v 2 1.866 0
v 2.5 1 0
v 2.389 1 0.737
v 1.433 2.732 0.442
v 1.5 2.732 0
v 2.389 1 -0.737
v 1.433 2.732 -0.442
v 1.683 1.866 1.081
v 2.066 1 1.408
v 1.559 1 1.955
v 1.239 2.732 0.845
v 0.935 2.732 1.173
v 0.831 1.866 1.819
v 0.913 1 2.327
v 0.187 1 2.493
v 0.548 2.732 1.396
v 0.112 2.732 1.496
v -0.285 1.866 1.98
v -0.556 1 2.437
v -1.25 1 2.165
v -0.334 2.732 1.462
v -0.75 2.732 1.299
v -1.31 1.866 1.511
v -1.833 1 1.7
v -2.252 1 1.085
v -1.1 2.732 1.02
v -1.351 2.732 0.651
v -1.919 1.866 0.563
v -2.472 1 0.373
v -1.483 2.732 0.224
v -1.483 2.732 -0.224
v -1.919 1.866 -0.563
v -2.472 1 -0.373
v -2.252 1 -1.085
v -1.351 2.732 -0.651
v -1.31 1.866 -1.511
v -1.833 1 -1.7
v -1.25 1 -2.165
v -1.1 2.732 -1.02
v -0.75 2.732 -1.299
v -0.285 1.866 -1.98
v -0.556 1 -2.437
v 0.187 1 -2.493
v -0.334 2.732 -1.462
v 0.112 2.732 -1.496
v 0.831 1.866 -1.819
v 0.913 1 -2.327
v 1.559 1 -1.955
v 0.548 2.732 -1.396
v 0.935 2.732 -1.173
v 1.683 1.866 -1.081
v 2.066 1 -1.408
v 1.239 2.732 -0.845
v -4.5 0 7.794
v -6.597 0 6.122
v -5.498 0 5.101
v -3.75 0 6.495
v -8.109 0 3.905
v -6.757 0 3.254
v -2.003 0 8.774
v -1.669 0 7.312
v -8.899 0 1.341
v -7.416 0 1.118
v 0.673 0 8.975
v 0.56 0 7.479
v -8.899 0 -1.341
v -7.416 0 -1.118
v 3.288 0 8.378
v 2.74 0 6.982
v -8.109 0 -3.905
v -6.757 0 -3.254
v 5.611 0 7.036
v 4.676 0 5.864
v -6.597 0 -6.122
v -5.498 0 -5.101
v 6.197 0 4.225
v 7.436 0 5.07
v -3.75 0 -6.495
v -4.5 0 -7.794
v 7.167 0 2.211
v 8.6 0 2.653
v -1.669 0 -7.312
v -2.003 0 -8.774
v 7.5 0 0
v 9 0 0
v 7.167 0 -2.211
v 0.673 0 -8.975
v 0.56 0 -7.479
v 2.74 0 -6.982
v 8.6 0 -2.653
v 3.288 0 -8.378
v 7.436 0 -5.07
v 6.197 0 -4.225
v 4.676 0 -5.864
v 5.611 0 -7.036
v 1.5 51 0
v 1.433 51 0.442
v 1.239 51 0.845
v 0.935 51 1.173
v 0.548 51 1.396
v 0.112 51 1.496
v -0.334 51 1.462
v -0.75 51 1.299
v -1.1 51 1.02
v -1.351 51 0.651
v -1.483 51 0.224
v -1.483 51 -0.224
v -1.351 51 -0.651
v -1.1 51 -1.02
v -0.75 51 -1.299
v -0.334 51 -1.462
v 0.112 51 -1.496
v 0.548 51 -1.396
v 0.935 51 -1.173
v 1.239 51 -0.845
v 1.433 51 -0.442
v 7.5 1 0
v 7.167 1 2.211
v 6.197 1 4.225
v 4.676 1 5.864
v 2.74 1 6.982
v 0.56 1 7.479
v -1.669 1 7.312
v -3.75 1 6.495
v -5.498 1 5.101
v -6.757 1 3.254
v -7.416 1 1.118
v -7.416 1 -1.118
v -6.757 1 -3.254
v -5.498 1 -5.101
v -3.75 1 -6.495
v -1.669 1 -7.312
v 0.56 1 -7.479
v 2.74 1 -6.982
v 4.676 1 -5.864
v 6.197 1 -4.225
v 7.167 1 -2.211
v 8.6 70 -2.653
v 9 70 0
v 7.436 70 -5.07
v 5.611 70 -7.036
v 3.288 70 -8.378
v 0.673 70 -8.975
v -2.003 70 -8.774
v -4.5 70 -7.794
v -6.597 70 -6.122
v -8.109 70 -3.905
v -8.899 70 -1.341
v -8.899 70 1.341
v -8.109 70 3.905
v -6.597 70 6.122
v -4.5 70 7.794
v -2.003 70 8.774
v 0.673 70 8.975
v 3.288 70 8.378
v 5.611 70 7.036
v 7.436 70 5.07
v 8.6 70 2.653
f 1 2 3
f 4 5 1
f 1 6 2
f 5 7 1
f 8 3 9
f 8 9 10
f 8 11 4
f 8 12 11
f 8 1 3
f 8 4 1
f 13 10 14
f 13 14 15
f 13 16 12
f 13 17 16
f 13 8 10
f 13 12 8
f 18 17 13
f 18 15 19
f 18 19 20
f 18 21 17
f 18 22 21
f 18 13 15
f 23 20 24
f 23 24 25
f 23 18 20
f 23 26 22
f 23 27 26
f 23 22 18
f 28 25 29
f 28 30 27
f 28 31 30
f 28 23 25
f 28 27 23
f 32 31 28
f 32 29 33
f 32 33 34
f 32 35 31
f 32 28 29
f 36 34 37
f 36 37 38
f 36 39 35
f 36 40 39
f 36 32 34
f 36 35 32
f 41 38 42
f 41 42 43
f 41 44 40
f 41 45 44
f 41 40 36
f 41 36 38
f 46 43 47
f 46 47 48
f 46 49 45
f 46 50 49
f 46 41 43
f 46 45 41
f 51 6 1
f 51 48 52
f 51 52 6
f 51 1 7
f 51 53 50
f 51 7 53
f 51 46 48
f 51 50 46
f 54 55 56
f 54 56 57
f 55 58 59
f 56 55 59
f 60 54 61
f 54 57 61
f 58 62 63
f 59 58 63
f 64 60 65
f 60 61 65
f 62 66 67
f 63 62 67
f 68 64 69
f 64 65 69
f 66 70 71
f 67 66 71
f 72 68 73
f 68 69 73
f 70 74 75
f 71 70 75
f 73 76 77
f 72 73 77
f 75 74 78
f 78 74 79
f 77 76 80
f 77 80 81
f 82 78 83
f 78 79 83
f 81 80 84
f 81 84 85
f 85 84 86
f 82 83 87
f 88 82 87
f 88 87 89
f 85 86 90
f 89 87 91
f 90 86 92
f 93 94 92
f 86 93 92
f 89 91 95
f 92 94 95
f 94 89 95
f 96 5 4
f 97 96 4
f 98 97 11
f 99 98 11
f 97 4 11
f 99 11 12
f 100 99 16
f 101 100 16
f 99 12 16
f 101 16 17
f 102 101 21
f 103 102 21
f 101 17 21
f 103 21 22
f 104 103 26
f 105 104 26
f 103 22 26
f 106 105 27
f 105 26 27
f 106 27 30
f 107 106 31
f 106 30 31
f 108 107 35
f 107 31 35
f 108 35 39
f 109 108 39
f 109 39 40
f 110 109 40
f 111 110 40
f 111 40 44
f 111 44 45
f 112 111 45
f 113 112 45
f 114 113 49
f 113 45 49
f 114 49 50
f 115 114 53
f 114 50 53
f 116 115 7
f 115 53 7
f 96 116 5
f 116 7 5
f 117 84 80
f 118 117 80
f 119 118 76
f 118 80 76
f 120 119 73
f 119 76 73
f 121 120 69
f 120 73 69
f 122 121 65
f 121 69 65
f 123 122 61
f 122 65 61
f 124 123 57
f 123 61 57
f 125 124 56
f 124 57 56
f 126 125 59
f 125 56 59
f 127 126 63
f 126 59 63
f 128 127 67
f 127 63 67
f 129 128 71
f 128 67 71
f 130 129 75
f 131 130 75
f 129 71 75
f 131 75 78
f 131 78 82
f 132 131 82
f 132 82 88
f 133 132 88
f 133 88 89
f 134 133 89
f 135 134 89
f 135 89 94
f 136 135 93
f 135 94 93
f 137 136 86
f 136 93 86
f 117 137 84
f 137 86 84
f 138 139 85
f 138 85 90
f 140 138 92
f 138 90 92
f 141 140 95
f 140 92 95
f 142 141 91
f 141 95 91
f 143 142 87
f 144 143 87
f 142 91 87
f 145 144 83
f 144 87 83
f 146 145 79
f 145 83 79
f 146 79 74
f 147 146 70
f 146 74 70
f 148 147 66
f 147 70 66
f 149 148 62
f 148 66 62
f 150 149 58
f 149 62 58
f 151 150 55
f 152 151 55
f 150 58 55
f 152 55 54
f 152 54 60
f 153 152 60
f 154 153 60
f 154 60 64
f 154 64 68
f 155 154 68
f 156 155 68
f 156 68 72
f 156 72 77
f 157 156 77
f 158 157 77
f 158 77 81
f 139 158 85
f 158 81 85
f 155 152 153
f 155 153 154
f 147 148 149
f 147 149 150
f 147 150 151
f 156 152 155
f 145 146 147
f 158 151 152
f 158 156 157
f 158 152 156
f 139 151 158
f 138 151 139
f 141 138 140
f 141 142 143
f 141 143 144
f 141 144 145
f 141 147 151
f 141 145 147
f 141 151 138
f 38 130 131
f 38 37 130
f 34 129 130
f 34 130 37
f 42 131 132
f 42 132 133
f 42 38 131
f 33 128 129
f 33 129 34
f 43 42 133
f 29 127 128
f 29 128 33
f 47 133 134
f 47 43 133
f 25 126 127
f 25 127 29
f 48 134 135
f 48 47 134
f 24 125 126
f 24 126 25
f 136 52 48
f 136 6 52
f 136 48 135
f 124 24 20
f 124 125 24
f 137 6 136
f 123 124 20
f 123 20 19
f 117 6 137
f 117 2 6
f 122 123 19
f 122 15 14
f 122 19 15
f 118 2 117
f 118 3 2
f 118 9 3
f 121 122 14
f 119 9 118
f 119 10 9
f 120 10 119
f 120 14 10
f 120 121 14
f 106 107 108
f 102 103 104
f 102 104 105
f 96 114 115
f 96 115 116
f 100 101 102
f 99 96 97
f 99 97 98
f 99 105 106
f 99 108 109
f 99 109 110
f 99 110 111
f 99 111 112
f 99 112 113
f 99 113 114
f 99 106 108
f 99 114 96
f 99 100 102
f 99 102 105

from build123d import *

# Parameters (mm, degrees)
SKETCH2_R           = 9
BOSS_EXTRUDE1_DEPTH = 70
SKETCH3_R           = 7.5
CUT_EXTRUDE1_DEPTH  = 1
SKETCH4_R           = 1.5
CUT_EXTRUDE2_DEPTH  = 50
CHAMFER1_SIZE       = 1
CHAMFER1_SIZE2      = 1.732050808


with BuildPart() as part:
    # Sketch2 → Boss-Extrude1 (new body)
    with BuildSketch(Plane(origin=(0, 0, 0), x_dir=(1, 0, 0), z_dir=(0, 1, 0))):
        Circle(SKETCH2_R)
    extrude(amount=BOSS_EXTRUDE1_DEPTH)

    # Sketch3 → Cut-Extrude1 (cut)
    with BuildSketch(Plane.XZ):
        Circle(SKETCH3_R)
    extrude(amount=-CUT_EXTRUDE1_DEPTH, mode=Mode.SUBTRACT)

    # Sketch4 → Cut-Extrude2 (cut)
    with BuildSketch(Plane.XZ.offset(-1)):
        Circle(SKETCH4_R)
    extrude(amount=-CUT_EXTRUDE2_DEPTH, mode=Mode.SUBTRACT)

    # Chamfer1
    chamfer1_edges = [part.edges().sort_by_distance(p)[0] for p in [
        (-1.5, 1, 0),
    ]]
    chamfer1_side = [part.faces().sort_by_distance(p)[0] for p in [
        (-7.287867966, 1, 0),
    ]]
    chamfer(chamfer1_edges, length=CHAMFER1_SIZE, length2=CHAMFER1_SIZE2, reference=chamfer1_side[0])


solid = part.part
